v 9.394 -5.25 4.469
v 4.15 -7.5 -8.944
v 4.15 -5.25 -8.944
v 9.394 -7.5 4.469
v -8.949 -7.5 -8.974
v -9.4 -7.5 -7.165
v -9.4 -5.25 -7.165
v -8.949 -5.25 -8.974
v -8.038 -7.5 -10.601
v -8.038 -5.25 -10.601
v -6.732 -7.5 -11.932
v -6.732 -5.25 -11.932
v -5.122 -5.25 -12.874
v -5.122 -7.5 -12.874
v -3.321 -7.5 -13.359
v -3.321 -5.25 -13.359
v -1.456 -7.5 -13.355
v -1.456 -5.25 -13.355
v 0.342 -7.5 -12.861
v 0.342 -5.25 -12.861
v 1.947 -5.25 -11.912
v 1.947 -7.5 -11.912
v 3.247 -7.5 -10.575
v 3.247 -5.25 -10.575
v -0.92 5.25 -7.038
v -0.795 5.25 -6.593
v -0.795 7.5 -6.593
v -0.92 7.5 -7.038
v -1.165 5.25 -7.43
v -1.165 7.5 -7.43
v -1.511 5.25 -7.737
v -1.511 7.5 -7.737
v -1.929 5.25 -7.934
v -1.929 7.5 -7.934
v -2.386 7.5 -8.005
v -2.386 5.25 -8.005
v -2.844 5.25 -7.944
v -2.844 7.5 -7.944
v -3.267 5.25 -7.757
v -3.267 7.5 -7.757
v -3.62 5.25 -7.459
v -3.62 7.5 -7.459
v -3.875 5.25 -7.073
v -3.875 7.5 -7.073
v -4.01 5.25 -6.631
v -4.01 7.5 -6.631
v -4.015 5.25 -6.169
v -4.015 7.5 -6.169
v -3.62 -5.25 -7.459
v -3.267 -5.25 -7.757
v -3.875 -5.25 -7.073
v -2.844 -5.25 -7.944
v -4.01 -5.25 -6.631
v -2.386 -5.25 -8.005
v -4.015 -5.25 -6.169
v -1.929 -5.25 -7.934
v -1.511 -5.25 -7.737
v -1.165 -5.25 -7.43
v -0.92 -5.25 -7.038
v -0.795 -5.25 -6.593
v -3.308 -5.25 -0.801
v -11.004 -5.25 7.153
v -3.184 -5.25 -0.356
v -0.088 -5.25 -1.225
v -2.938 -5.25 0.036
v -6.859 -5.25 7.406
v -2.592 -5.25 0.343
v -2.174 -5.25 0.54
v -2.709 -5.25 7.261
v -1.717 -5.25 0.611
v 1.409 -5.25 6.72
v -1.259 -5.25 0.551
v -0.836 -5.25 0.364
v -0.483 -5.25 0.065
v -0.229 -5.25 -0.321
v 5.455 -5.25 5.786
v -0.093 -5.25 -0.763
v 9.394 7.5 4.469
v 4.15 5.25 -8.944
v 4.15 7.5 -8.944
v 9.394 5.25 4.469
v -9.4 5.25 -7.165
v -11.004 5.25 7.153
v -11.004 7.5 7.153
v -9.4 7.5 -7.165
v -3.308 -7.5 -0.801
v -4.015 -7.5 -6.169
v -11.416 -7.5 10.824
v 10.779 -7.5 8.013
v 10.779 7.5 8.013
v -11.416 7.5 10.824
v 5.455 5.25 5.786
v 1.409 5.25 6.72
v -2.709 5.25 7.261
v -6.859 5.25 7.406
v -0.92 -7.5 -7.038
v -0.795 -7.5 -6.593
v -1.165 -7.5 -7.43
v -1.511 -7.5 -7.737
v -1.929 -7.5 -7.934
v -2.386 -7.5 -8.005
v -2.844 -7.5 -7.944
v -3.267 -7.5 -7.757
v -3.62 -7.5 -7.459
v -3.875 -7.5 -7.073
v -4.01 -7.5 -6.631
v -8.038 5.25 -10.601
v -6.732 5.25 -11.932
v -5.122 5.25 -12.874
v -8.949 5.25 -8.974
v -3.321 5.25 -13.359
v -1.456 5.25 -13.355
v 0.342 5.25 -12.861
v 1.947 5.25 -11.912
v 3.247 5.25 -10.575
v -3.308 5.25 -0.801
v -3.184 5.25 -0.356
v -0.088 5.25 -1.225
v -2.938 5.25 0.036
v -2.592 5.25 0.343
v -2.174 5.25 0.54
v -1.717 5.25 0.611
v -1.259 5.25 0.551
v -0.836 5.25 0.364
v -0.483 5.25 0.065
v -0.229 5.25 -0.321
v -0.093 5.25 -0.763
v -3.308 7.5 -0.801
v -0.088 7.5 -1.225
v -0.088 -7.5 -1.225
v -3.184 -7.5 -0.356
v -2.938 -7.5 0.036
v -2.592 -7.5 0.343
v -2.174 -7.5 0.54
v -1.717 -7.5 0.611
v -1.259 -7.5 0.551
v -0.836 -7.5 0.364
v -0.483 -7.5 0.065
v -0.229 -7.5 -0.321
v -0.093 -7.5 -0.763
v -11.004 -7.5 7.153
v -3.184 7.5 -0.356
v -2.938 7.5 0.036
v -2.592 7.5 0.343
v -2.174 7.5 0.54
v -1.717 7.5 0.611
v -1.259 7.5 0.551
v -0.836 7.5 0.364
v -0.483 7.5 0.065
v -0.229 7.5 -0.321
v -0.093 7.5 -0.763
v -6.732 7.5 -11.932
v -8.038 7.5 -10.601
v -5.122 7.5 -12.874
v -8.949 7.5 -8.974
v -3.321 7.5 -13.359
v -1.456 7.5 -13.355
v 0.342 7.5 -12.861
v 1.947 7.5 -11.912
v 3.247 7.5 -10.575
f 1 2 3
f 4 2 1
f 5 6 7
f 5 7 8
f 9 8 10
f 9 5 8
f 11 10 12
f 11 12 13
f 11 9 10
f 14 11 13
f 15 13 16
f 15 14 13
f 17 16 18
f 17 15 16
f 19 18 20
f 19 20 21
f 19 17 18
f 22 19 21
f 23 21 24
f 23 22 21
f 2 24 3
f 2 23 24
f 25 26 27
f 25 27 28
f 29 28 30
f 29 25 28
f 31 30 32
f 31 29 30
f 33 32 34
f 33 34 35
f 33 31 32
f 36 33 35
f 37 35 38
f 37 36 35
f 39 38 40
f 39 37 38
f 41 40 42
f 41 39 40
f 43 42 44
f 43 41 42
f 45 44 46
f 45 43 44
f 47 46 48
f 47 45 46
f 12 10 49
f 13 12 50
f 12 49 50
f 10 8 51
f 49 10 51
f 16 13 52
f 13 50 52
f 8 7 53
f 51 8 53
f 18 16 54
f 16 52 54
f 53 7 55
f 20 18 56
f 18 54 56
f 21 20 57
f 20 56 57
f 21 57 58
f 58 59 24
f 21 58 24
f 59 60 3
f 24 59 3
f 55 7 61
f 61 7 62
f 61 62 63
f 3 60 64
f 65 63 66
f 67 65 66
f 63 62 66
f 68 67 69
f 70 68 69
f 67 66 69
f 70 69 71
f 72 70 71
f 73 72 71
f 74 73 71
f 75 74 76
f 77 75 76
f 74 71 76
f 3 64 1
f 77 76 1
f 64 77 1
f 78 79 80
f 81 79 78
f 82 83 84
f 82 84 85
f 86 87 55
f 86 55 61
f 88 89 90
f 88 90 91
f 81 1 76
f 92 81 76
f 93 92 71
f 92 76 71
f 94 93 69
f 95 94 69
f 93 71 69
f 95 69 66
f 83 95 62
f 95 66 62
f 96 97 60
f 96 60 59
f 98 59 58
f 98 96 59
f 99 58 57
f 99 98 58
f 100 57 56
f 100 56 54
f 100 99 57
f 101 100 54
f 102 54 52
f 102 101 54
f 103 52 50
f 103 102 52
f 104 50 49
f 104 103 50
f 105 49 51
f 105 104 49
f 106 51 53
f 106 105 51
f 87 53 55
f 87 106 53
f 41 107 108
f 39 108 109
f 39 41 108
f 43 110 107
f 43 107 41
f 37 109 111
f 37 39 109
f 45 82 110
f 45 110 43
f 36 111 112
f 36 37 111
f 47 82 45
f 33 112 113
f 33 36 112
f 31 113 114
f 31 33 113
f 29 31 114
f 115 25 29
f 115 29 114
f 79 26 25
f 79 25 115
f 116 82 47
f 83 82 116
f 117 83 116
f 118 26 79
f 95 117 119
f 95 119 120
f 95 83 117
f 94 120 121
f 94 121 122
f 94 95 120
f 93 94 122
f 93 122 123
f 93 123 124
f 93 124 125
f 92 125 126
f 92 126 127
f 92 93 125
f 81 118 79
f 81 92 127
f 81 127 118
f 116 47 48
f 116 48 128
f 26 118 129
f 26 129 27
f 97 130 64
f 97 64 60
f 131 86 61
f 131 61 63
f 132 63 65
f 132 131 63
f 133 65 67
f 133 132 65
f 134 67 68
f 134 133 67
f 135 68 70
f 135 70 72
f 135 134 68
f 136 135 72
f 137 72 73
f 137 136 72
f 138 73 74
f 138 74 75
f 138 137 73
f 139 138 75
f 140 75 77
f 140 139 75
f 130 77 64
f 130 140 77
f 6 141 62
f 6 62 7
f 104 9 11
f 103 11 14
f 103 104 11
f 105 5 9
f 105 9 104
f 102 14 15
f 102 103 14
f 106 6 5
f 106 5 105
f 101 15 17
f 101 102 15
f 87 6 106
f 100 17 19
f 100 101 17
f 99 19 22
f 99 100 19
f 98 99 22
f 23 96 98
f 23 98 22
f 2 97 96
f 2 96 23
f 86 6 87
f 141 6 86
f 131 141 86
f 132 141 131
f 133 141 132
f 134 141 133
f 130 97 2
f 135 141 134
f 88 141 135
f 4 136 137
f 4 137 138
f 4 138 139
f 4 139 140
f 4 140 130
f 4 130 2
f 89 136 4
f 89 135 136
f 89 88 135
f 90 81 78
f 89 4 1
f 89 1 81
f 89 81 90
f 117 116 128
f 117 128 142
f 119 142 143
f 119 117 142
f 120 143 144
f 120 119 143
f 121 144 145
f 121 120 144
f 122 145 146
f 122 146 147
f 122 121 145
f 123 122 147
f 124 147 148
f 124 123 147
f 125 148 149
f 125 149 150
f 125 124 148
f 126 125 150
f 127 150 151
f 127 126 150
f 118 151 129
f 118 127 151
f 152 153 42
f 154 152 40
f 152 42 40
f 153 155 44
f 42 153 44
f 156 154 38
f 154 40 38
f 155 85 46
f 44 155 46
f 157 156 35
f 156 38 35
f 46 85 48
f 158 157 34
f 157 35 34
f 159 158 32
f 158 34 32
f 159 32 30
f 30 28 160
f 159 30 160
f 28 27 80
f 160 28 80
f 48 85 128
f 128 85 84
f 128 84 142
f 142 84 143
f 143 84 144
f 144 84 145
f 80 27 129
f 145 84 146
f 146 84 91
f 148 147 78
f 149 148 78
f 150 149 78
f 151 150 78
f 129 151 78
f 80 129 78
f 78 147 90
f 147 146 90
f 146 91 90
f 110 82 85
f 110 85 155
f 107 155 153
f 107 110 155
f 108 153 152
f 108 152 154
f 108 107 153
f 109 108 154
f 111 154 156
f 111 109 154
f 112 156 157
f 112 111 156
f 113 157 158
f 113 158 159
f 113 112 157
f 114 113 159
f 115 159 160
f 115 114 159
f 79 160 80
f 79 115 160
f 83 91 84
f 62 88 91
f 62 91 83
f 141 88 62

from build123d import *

# Parameters (mm, degrees)
F1_DEPTH = 7.5
F2_DEPTH = 5.25


# Not quite as in the source:
# - ends of sketch curves that miss each other by under 0.0002 mm in the source are joined


with BuildPart() as f1:
    # F0 (on Front) → F1 (new body, symmetric)
    with BuildSketch(Plane.XZ):
        with BuildLine():
            ThreePointArc((-11.0043239024, 7.1529938994), (-0.6435162461, 7.0398408721), (9.3939724206, 4.4692455787))
            Line((9.3939724206, 4.4692455787), (10.7793952497, 8.0129774852))
            Line((10.7793952497, 8.0129774852), (-11.4156674583, 10.8236569963))
            Line((-11.4156674583, 10.8236569963), (-11.0043239024, 7.1529938994))
        make_face()
        with BuildLine():
            Line((4.1502654463, -8.9435067945), (9.39397455, 4.4692447462))
            ThreePointArc((9.39397455, 4.4692447462), (-0.6435162461, 7.0398408721), (-11.0043239024, 7.1529938994))
            Line((-11.0043239024, 7.1529938994), (-9.3998677417, -7.1645337772))
            ThreePointArc((-9.3998677417, -7.1645337772), (-3.3213281789, -13.3593367926), (4.1502654463, -8.9435067945))
        make_face()
        with BuildLine():
            ThreePointArc((-3.3084953622, -0.8006877888), (-1.4860286023, 0.5975869129), (-0.0877539006, -1.2248798469))
            Line((-0.0877539006, -1.2248798469), (-0.7947424255, -6.5927825509))
            ThreePointArc((-0.7947424255, -6.5927825509), (-2.6172092627, -7.9910572424), (-4.0154839644, -6.1685904826))
            Line((-4.0154839644, -6.1685904826), (-3.3084953622, -0.8006877888))
        make_face(mode=Mode.SUBTRACT)
    extrude(amount=F1_DEPTH, both=True)

    # F0 (on Front) → F2 (cut, symmetric)
    with BuildSketch(Plane.XZ):
        with BuildLine():
            Line((4.1502654463, -8.9435067945), (9.39397455, 4.4692447462))
            ThreePointArc((9.39397455, 4.4692447462), (-0.6435162461, 7.0398408721), (-11.0043239024, 7.1529938994))
            Line((-11.0043239024, 7.1529938994), (-9.3998677417, -7.1645337772))
            ThreePointArc((-9.3998677417, -7.1645337772), (-3.3213281789, -13.3593367926), (4.1502654463, -8.9435067945))
        make_face()
        with BuildLine():
            ThreePointArc((-3.3084953622, -0.8006877888), (-1.4860286023, 0.5975869129), (-0.0877539006, -1.2248798469))
            Line((-0.0877539006, -1.2248798469), (-0.7947424255, -6.5927825509))
            ThreePointArc((-0.7947424255, -6.5927825509), (-2.6172092627, -7.9910572424), (-4.0154839644, -6.1685904826))
            Line((-4.0154839644, -6.1685904826), (-3.3084953622, -0.8006877888))
        make_face(mode=Mode.SUBTRACT)
    extrude(amount=F2_DEPTH, both=True, mode=Mode.SUBTRACT)


solid = f1.part
